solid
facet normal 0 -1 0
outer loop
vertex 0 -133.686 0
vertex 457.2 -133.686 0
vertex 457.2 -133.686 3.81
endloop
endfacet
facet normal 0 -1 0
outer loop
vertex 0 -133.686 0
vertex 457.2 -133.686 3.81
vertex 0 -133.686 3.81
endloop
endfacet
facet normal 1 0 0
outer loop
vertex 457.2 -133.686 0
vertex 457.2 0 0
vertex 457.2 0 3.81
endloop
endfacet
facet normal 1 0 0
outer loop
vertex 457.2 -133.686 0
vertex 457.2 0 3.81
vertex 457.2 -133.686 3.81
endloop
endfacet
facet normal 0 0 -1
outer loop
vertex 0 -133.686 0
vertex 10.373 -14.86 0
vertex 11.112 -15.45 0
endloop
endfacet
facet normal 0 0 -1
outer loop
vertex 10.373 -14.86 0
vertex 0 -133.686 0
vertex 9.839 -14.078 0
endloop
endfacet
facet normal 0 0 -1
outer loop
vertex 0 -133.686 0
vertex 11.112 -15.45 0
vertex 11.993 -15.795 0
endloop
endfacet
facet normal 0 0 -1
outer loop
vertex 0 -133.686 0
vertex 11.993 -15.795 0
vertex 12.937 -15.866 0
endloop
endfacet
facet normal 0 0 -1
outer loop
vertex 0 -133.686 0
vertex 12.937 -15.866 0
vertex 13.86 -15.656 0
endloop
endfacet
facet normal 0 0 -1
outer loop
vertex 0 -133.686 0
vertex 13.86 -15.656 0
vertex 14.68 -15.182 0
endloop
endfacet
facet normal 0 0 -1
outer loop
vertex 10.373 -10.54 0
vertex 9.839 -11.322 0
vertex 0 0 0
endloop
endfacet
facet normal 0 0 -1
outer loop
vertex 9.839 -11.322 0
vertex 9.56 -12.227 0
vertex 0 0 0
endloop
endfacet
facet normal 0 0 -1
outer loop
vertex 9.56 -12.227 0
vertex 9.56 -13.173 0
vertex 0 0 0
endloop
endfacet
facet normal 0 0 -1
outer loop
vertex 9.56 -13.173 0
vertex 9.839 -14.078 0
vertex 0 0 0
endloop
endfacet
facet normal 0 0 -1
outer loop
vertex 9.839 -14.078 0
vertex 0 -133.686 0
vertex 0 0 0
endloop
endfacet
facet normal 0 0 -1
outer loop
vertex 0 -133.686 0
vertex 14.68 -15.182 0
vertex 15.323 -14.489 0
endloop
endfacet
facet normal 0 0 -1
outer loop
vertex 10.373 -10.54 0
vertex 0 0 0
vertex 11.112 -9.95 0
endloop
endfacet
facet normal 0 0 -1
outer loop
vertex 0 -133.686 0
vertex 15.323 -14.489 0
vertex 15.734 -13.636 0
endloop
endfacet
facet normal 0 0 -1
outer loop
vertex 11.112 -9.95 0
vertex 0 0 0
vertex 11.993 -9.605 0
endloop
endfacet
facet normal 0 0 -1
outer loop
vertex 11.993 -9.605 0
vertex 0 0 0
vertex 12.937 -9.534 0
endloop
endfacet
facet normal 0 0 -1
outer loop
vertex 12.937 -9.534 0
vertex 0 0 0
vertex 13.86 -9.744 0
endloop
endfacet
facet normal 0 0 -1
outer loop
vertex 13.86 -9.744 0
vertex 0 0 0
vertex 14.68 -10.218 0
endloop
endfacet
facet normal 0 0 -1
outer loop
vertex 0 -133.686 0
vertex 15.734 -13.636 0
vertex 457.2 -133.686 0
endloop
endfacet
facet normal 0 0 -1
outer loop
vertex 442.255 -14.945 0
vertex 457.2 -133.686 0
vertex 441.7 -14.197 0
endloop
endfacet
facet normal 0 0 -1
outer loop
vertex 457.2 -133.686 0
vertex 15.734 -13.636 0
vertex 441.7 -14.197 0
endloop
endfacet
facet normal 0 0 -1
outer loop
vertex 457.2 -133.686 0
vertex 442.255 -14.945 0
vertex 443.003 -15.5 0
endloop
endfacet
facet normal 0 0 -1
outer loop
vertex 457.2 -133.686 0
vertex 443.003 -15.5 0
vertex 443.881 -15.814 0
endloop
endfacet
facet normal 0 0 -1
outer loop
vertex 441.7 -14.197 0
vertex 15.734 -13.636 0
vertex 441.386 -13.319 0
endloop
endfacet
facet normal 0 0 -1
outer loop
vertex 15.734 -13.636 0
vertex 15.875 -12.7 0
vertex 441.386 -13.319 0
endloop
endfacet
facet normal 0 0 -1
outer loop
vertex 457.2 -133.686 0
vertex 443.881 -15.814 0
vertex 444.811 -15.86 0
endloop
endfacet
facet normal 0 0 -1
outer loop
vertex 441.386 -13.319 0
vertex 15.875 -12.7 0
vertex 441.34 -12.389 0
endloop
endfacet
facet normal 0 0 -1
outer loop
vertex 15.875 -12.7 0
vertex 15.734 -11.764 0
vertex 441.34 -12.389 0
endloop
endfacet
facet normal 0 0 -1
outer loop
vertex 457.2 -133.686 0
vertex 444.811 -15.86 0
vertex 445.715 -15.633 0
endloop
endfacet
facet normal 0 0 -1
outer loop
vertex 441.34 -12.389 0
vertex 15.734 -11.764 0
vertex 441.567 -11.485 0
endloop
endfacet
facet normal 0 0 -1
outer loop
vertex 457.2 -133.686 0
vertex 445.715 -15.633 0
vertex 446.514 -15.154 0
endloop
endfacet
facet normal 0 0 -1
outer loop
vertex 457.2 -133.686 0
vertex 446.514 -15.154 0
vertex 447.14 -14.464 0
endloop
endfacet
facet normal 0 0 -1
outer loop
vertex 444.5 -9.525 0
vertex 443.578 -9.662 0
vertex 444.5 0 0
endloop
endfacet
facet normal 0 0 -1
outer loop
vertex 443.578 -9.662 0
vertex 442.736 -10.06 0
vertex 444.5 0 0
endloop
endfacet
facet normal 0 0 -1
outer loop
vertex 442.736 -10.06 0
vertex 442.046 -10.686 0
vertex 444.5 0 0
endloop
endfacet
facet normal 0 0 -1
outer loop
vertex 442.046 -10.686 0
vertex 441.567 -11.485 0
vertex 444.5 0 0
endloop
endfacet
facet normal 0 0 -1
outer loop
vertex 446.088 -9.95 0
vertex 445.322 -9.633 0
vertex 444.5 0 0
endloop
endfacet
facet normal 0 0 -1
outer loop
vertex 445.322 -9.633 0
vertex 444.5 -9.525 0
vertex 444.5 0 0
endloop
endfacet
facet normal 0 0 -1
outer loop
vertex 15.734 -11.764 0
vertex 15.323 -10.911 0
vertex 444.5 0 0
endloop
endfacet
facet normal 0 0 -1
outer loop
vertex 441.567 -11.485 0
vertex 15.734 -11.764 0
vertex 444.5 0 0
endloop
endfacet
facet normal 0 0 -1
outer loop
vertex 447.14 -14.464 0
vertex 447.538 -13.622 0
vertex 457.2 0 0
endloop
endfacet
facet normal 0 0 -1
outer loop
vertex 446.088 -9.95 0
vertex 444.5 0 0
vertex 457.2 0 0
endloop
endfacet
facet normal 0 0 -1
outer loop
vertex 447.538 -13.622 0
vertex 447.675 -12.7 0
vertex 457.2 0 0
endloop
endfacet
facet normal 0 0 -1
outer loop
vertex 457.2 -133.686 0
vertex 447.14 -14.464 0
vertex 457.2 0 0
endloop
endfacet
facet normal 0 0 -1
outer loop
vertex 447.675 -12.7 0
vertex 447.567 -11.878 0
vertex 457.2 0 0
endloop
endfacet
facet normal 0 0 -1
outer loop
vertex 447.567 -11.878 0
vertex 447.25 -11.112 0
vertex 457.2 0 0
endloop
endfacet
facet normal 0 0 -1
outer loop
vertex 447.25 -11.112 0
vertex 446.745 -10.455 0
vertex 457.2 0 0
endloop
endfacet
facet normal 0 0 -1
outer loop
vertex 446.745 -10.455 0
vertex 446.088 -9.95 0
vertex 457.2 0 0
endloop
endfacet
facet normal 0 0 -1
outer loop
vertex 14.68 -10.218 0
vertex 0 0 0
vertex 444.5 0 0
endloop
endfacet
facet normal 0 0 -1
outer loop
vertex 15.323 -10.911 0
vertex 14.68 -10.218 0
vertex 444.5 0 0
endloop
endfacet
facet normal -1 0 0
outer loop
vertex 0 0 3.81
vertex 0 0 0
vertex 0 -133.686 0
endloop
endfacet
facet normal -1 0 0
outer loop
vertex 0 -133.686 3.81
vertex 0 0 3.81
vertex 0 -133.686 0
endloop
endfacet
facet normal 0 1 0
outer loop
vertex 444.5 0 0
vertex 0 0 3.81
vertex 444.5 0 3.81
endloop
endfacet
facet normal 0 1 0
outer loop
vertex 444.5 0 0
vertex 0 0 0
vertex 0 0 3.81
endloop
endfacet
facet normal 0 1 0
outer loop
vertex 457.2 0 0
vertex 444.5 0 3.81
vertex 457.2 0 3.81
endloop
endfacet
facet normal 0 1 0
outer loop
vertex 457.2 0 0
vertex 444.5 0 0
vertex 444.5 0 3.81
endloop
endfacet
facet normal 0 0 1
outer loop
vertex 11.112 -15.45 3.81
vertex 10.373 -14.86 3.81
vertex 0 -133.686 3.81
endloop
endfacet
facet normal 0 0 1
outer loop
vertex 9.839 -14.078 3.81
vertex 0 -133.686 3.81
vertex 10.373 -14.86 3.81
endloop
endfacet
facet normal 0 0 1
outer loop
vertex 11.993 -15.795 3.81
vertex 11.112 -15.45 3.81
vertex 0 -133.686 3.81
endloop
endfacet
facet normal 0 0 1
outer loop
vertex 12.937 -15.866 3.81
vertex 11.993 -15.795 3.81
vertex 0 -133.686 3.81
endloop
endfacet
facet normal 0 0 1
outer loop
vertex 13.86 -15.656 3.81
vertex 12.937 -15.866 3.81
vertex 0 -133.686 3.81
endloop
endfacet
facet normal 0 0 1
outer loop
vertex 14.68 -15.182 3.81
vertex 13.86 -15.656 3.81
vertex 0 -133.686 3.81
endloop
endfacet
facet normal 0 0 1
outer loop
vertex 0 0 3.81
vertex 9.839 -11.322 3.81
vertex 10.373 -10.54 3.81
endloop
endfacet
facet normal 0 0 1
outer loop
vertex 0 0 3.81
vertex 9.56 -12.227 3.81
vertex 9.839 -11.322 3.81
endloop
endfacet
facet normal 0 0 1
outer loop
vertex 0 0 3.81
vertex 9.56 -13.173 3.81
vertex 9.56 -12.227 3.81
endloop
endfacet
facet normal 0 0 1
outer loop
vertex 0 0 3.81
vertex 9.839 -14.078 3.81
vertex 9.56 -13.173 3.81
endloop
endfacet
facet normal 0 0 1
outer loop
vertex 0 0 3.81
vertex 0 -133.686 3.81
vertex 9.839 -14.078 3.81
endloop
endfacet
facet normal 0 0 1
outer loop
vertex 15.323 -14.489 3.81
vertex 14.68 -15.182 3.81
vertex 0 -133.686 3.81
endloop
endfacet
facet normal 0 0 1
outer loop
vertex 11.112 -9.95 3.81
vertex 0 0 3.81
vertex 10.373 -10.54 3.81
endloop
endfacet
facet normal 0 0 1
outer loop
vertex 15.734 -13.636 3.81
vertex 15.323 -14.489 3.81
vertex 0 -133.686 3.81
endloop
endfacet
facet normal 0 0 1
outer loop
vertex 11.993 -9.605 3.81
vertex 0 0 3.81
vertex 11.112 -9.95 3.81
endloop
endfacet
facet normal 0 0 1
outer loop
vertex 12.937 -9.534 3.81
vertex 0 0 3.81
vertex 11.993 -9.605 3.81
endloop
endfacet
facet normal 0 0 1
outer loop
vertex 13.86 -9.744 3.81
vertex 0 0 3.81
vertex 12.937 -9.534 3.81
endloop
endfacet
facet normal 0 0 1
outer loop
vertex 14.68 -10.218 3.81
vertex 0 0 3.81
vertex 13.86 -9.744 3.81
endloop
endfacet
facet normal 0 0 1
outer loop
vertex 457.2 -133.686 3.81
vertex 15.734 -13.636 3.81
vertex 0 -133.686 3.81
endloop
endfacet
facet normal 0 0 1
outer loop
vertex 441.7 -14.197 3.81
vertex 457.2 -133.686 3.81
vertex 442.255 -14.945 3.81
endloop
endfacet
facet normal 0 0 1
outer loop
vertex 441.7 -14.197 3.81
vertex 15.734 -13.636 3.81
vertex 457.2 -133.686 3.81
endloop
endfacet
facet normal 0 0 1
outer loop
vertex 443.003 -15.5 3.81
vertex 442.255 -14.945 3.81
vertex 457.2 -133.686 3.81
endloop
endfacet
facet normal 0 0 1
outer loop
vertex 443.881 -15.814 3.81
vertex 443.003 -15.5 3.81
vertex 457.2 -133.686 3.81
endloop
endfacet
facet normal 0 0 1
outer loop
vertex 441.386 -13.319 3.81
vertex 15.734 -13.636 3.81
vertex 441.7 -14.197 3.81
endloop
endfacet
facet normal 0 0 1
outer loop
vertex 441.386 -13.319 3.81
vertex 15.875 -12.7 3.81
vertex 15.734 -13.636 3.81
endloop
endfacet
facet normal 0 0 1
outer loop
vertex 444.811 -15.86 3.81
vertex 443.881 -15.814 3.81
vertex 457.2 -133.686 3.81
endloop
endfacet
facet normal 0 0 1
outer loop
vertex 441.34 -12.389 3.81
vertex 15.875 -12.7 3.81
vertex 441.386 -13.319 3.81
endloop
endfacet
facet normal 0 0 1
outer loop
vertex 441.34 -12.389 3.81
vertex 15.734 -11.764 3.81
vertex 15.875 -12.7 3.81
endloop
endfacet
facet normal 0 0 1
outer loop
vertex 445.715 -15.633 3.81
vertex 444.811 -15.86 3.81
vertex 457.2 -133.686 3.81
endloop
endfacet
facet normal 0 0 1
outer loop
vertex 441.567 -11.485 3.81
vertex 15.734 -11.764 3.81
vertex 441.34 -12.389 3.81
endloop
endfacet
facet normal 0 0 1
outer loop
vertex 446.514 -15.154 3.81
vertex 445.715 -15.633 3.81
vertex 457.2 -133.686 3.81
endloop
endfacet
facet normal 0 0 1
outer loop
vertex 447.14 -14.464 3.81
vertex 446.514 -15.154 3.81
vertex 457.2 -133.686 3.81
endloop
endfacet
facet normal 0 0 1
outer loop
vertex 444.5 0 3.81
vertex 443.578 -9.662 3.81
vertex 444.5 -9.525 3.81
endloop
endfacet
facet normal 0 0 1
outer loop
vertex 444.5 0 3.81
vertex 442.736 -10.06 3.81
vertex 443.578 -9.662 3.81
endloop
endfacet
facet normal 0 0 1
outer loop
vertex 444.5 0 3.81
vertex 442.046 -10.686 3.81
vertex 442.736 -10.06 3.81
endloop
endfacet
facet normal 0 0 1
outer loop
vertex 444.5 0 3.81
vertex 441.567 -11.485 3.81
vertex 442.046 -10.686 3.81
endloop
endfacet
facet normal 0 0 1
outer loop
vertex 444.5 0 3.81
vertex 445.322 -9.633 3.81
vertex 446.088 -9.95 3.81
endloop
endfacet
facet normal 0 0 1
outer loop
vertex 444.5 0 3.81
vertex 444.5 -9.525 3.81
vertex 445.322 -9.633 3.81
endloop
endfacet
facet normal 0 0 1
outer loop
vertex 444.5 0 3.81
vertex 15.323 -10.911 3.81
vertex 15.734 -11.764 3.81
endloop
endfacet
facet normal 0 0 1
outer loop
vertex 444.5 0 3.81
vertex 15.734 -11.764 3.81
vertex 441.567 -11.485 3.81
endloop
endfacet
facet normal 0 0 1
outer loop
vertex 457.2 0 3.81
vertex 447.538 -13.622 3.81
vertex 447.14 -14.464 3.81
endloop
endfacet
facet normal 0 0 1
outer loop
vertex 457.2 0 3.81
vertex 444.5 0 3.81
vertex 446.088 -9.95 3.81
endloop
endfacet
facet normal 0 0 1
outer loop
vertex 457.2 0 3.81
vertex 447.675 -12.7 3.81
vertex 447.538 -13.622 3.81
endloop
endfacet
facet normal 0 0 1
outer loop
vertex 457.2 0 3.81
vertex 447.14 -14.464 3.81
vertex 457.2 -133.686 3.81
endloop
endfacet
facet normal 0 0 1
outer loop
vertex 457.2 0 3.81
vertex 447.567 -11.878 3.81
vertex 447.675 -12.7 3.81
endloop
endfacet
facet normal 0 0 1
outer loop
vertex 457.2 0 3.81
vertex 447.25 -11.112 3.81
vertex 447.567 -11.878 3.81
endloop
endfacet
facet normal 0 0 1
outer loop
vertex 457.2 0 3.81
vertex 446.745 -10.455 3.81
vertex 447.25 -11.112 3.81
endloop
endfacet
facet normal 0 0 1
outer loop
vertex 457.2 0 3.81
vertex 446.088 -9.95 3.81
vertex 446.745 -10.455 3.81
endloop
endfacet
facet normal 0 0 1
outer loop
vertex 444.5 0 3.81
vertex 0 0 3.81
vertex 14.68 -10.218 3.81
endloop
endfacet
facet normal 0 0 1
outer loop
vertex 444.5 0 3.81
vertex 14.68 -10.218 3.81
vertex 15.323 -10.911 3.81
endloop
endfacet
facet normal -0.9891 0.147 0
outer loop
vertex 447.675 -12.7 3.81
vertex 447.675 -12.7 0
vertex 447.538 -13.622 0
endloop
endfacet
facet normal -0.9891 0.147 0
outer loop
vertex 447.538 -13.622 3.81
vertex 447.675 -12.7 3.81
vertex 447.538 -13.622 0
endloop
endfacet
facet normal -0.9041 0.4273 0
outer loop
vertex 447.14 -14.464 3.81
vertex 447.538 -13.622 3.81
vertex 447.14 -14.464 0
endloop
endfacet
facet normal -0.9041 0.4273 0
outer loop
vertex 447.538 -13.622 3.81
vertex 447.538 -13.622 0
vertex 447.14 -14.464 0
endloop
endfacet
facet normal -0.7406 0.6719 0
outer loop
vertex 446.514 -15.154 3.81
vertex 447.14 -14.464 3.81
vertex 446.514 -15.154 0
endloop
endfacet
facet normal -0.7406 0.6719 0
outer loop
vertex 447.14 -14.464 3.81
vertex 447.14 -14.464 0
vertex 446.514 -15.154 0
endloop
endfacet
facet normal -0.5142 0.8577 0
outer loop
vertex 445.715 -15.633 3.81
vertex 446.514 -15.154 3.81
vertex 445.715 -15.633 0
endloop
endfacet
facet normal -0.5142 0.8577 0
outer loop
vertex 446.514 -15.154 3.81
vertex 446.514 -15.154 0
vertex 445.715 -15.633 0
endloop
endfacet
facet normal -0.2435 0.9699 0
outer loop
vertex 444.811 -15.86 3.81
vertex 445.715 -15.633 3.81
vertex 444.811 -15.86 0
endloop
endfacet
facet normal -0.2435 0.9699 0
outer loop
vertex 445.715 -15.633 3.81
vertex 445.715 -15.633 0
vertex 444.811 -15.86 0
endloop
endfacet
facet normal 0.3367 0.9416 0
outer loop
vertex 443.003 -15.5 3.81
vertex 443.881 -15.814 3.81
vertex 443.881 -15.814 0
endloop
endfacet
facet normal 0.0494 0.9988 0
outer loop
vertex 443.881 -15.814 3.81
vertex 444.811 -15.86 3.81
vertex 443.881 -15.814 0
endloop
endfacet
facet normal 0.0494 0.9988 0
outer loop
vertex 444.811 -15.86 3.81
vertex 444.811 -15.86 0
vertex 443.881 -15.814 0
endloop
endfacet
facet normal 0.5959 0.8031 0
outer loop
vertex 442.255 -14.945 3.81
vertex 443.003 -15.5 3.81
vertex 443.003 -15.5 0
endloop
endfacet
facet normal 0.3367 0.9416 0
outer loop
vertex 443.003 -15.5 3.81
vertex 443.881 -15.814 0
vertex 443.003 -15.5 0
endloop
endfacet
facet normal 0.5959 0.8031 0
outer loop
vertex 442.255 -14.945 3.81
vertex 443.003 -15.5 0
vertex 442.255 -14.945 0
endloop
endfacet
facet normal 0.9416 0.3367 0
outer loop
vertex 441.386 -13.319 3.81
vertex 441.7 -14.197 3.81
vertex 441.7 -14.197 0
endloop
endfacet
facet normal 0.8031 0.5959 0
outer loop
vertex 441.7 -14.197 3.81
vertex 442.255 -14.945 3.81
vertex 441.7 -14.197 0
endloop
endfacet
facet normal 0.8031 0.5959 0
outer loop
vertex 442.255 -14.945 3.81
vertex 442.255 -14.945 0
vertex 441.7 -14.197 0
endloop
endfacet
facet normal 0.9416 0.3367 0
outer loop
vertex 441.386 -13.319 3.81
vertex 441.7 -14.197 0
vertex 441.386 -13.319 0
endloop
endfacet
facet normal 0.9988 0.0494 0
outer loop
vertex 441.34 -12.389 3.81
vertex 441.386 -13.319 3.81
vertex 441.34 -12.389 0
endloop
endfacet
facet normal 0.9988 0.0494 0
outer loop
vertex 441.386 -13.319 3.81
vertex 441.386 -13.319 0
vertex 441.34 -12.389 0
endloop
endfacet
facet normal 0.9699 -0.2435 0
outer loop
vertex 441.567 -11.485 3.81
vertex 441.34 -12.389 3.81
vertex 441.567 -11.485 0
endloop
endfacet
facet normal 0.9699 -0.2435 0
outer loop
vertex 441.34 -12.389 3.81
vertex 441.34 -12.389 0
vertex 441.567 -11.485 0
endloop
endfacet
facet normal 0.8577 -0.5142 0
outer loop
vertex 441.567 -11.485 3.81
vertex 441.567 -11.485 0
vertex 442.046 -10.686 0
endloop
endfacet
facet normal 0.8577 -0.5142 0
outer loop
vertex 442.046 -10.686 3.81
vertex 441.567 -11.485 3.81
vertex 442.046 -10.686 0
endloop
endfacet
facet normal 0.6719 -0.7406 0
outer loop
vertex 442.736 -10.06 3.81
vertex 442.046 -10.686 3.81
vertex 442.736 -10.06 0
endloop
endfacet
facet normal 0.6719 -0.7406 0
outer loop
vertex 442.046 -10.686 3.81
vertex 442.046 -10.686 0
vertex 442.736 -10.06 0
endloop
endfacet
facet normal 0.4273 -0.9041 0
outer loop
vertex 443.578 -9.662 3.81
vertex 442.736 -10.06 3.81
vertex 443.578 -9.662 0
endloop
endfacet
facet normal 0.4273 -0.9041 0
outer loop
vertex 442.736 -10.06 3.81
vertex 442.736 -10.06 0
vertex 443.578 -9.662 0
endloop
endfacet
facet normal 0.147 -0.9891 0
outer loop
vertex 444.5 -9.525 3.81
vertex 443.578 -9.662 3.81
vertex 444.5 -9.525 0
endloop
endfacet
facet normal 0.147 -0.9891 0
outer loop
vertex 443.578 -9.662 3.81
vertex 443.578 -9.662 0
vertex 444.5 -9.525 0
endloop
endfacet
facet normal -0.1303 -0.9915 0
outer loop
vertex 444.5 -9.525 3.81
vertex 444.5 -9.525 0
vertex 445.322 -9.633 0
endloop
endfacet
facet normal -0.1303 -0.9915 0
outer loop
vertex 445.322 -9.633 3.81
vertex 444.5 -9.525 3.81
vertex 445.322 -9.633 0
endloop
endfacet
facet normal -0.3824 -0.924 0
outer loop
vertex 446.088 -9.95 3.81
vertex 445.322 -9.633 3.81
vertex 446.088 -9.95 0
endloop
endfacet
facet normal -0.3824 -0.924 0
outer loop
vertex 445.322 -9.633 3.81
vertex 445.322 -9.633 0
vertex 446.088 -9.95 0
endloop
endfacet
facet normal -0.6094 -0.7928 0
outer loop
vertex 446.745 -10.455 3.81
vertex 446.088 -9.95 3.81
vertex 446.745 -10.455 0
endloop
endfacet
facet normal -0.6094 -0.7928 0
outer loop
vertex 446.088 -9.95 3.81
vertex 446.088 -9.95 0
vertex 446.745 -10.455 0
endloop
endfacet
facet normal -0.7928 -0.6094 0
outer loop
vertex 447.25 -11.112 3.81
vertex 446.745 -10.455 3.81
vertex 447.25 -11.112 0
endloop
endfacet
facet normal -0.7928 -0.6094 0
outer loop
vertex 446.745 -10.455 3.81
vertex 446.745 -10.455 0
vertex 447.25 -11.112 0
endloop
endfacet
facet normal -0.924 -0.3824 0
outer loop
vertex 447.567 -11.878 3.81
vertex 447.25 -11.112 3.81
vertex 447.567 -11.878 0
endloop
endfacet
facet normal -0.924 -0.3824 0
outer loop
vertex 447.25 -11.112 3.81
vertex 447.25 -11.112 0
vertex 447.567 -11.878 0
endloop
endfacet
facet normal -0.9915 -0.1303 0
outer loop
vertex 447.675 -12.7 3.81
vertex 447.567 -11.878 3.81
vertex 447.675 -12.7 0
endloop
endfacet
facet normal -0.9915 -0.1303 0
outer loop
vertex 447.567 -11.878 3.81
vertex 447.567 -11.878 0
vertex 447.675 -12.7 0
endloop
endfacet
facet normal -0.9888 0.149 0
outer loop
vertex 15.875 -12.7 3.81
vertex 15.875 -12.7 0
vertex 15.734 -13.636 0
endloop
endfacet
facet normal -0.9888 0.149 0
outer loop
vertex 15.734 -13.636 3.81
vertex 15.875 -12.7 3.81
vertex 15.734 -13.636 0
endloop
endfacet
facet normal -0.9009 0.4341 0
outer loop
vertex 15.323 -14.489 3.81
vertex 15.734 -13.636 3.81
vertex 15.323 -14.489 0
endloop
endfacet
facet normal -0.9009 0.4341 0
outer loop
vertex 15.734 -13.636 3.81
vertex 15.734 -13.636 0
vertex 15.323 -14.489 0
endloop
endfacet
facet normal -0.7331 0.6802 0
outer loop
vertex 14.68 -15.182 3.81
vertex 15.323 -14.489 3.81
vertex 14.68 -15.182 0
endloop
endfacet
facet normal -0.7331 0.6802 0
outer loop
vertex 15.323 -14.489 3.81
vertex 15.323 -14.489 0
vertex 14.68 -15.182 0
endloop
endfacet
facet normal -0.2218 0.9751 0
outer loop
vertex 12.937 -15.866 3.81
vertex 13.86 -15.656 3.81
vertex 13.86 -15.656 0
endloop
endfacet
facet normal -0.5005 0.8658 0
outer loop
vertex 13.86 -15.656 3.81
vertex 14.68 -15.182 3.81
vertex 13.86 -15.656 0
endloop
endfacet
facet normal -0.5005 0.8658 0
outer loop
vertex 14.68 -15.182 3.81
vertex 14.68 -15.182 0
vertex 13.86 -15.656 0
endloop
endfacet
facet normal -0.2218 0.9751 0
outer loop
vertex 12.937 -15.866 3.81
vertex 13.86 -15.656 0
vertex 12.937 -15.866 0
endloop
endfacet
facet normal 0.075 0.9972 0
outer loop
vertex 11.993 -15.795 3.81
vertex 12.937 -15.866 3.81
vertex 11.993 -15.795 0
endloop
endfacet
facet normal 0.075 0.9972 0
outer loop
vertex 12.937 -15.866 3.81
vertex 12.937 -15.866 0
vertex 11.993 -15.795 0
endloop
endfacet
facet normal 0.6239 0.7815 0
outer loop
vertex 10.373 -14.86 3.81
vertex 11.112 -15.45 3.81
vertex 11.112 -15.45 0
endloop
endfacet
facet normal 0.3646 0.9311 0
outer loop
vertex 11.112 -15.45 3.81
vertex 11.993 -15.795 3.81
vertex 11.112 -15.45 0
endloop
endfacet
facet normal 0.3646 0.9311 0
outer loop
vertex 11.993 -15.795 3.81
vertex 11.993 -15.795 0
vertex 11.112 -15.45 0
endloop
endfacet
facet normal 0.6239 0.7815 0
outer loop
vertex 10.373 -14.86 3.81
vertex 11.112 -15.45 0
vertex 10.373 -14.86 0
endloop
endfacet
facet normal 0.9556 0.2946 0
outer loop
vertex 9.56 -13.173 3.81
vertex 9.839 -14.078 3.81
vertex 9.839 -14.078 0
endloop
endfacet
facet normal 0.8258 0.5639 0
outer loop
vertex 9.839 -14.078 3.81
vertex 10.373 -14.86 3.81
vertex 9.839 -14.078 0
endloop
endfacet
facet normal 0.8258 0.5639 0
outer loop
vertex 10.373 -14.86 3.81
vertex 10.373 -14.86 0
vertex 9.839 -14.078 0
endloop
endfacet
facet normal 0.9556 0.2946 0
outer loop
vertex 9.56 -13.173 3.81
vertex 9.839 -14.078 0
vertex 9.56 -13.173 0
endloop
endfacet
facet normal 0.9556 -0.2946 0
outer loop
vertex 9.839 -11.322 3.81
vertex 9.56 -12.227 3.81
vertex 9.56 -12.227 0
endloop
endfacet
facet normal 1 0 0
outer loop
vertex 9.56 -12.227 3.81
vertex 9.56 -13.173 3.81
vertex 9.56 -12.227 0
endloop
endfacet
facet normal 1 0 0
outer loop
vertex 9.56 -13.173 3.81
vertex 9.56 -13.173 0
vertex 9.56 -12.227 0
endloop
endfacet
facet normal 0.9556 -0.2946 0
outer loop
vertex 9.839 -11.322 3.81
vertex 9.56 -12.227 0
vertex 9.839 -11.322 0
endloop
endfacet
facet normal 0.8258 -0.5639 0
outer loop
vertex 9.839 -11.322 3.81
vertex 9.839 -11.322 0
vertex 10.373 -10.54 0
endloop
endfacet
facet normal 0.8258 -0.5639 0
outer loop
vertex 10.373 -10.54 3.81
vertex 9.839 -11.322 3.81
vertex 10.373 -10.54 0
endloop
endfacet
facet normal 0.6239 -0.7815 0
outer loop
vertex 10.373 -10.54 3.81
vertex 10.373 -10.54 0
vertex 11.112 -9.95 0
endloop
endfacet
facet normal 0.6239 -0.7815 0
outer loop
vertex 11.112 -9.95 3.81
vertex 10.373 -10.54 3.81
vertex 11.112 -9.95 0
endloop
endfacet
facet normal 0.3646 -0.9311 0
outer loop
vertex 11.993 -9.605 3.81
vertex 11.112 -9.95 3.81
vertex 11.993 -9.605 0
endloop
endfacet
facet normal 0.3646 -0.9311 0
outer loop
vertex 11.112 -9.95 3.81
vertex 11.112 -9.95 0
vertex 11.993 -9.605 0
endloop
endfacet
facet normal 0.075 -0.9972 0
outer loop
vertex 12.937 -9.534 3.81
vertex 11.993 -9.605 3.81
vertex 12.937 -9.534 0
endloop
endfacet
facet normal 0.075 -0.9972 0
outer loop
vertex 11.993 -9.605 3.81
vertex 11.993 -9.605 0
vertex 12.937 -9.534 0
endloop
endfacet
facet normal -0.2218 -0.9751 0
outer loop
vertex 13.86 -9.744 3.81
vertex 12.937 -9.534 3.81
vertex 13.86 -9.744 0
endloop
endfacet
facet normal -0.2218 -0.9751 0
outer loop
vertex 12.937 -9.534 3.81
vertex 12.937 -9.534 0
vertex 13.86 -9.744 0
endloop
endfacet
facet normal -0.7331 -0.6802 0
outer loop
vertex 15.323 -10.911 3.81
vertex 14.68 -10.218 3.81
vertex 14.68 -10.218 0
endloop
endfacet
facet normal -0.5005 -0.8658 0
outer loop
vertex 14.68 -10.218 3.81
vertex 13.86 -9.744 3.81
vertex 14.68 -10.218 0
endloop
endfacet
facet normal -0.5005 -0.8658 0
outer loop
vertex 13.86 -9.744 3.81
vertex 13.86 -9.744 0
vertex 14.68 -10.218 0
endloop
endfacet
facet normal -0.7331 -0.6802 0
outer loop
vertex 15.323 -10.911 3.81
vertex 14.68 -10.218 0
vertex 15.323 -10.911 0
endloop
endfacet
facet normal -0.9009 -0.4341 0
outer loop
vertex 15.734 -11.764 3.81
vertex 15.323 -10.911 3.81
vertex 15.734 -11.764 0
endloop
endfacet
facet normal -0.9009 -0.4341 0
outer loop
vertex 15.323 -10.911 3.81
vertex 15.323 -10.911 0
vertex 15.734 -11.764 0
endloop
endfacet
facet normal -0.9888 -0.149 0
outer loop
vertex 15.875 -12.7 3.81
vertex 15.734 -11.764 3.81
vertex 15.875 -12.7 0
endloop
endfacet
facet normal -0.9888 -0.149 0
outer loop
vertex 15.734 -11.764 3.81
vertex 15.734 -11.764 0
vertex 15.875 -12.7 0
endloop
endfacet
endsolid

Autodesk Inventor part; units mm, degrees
ref_plane "YZ Plane" through (0, 0, 0) normal (1, 0, 0) x (0, 1, 0)
ref_plane "XZ Plane" through (0, 0, 0) normal (0, 1, 0) x (-1, 0, 0)
ref_plane "Work Plane1" through (0, 0, 0) normal (0, 0, 1) x (1, 0, 0)
sketch "Sketch1" plane through (0, 0, 0) normal (0, 0, 1) x (1, 0, 0)
  circle A0 centre (12.7, -12.7) radius 3.175 projected
  line L0 (0, 0) -> (0, -25.4895) projected
  line L1 (25.4, -25.4895) -> (0, -25.4895) projected
  line L2 (25.4, 0) -> (25.4, -25.4895) projected
  line L3 (0, 0) -> (25.4, 0) projected
  line L4 (0, 0) -> (457.2, 0)
  line L5 (457.2, 0) -> (457.2, -133.6856)
  line L6 (457.2, -133.6856) -> (0, -133.6856)
  line L7 (0, -133.6856) -> (0, 0)
  line L8 (457.2, 0) -> (444.5, 0)
  line L9 (444.5, 0) -> (444.5, -12.7)
  circle A1 centre (444.5, -12.7) radius 3.175
  dimension "d0" = 457.2
  dimension "d1" = 12.7
  dimension "d2" = 12.7
  dimension "d3" = 6.35
ref_plane "Work Plane2" through (0, -25.4254, 3.81) normal (0, 0, -1) x (0, 1, 0)
extrude "Extrusion1" add sketch "Sketch1" along normal up to surface (3.81 mm away)
properties part number "Front.ipt plate"
